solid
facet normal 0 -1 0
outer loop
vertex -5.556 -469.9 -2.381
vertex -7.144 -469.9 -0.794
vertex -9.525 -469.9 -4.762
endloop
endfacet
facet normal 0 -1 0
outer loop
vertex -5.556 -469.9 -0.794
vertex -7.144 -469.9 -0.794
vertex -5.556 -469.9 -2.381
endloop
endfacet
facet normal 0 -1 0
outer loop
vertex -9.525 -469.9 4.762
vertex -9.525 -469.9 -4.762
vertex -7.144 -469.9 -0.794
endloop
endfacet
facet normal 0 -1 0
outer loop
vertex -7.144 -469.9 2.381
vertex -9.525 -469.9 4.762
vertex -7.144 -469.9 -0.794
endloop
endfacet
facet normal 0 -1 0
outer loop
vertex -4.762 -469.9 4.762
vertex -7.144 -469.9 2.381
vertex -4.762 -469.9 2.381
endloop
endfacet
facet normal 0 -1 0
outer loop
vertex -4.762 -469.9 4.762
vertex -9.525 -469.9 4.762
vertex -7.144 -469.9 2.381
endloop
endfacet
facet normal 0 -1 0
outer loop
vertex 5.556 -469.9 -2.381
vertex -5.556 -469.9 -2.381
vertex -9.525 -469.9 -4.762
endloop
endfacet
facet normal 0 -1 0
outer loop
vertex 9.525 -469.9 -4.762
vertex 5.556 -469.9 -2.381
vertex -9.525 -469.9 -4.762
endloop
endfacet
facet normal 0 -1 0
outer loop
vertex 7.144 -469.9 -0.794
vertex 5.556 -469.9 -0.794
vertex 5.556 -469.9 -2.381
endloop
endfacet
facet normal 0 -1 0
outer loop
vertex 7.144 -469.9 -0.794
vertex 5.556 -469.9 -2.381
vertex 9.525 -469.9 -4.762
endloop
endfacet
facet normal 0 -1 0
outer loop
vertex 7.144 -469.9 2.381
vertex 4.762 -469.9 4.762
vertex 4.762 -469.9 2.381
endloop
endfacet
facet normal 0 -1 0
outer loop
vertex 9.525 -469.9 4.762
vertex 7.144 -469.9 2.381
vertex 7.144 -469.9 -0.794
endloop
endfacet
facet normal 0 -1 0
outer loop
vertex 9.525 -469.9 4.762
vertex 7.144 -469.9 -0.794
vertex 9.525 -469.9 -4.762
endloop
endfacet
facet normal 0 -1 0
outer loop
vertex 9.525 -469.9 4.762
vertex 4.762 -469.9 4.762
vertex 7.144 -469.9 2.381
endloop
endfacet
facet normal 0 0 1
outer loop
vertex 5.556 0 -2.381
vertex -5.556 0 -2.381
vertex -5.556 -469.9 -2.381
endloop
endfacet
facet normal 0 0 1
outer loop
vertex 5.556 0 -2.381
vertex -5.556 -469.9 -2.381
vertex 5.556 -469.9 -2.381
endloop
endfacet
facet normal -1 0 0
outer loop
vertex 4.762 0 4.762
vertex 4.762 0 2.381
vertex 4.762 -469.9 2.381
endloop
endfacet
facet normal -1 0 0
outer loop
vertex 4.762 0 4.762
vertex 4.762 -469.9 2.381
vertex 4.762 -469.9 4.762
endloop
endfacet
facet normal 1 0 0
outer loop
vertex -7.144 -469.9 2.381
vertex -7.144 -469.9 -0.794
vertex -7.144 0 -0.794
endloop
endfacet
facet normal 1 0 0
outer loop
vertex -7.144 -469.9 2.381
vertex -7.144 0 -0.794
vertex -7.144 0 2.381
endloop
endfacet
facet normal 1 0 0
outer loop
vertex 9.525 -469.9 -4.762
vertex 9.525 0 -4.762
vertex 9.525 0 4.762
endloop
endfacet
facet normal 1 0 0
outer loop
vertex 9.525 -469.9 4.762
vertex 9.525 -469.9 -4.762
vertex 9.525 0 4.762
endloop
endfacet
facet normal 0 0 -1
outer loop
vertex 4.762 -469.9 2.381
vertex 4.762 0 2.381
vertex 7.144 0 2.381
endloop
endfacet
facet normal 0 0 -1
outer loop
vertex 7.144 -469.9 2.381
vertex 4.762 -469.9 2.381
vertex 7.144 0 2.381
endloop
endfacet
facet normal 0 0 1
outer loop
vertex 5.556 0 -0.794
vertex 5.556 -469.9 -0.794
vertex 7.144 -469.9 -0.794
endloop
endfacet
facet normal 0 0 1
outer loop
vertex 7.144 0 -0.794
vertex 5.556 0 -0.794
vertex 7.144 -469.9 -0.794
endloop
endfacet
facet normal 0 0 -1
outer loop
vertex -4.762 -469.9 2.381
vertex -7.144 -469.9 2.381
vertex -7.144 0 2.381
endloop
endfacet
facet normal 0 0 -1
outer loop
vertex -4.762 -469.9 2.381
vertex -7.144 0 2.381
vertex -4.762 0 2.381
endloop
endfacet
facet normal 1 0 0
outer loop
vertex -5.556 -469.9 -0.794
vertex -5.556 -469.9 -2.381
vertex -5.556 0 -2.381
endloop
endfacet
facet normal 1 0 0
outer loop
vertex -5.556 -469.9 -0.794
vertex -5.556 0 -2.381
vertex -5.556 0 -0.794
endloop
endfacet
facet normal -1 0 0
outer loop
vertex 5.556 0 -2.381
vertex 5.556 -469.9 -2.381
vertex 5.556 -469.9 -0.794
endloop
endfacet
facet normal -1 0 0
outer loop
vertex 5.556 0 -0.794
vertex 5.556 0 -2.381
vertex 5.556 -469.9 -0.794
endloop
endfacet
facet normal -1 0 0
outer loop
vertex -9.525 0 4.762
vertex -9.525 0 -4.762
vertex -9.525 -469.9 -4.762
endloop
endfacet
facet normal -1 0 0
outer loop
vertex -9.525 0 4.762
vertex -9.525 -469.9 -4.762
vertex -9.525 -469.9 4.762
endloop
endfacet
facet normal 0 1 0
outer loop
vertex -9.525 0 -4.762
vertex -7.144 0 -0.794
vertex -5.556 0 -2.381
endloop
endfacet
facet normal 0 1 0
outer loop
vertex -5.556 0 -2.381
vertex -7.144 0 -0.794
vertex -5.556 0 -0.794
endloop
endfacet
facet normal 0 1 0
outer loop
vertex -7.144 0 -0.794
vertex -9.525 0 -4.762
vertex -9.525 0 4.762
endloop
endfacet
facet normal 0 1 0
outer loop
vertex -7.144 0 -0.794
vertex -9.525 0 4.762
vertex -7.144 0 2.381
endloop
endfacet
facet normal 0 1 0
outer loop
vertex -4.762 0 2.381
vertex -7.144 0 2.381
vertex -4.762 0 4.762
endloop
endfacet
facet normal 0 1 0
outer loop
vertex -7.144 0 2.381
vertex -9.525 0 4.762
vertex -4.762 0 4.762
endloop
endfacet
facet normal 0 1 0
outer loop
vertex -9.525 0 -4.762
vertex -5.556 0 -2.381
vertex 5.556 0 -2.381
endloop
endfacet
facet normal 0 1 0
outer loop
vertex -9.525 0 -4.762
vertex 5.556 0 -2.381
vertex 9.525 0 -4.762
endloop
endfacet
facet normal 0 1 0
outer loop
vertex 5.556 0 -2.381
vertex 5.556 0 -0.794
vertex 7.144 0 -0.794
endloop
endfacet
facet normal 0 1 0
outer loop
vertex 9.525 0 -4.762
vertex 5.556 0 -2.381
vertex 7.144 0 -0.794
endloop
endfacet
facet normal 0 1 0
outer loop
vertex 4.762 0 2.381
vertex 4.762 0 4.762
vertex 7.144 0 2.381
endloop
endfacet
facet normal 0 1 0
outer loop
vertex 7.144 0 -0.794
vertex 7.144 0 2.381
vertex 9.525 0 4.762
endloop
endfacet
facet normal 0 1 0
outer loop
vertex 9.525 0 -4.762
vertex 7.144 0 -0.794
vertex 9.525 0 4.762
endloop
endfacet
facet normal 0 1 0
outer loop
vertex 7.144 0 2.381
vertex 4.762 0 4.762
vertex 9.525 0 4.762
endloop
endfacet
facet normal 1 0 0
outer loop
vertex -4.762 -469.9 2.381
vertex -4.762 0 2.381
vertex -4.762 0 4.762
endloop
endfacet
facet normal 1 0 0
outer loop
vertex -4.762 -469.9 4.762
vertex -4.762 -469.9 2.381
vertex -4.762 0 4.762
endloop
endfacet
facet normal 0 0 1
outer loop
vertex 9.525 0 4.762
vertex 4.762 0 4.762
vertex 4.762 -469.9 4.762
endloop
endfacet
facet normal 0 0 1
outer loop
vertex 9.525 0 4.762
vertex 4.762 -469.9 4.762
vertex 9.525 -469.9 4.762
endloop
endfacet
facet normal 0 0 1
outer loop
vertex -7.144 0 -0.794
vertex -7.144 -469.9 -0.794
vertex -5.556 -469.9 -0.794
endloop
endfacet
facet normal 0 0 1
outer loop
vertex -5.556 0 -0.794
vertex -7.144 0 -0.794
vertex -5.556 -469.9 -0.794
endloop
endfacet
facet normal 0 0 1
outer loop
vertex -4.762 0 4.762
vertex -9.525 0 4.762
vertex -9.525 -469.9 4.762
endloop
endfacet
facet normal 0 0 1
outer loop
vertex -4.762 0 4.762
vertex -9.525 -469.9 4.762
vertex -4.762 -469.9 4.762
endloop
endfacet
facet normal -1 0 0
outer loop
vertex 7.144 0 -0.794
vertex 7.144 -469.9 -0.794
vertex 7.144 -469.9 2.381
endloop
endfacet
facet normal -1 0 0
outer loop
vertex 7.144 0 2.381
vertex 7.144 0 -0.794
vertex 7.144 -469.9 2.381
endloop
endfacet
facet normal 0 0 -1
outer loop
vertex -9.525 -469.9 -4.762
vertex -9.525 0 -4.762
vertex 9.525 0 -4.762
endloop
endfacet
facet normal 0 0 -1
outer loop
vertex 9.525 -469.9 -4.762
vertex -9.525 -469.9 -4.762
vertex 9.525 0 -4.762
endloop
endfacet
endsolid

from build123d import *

# Parameters (mm, degrees)
SKETCH_W        = 19.05
SKETCH_H        = 9.525
PAD_DEPTH       = 469.9
SKETCH001_W     = 9.525
SKETCH001_H     = 2.38125
POCKET_DEPTH    = 469.901
SKETCH002_W     = 14.2875
SKETCH002_H     = 3.175
POCKET001_DEPTH = 469.901
SKETCH003_W     = 11.1125
SKETCH003_H     = 1.5875
POCKET002_DEPTH = 469.901


with BuildPart() as part:
    # Sketch → Pad (new body)
    with BuildSketch(Plane.XZ):
        Rectangle(SKETCH_W, SKETCH_H)
    extrude(amount=PAD_DEPTH)

    # Sketch001 (on Face6 of Pad) → Pocket (cut, through all)
    with BuildSketch(Plane.XZ.offset(469.9)):
        with Locations((0, 3.571875)):
            Rectangle(SKETCH001_W, SKETCH001_H)
    extrude(amount=-POCKET_DEPTH, mode=Mode.SUBTRACT)

    # Sketch002 (on Face5 of Pocket) → Pocket001 (cut, through all)
    with BuildSketch(Plane.XZ.offset(469.9)):
        with Locations((0, 0.79375)):
            Rectangle(SKETCH002_W, SKETCH002_H)
    extrude(amount=-POCKET001_DEPTH, mode=Mode.SUBTRACT)

    # Sketch003 (on Face5 of Pocket001) → Pocket002 (cut, through all)
    with BuildSketch(Plane.XZ.offset(469.9)):
        with Locations((0, -1.5875)):
            Rectangle(SKETCH003_W, SKETCH003_H)
    extrude(amount=-POCKET002_DEPTH, mode=Mode.SUBTRACT)


solid = part.part
